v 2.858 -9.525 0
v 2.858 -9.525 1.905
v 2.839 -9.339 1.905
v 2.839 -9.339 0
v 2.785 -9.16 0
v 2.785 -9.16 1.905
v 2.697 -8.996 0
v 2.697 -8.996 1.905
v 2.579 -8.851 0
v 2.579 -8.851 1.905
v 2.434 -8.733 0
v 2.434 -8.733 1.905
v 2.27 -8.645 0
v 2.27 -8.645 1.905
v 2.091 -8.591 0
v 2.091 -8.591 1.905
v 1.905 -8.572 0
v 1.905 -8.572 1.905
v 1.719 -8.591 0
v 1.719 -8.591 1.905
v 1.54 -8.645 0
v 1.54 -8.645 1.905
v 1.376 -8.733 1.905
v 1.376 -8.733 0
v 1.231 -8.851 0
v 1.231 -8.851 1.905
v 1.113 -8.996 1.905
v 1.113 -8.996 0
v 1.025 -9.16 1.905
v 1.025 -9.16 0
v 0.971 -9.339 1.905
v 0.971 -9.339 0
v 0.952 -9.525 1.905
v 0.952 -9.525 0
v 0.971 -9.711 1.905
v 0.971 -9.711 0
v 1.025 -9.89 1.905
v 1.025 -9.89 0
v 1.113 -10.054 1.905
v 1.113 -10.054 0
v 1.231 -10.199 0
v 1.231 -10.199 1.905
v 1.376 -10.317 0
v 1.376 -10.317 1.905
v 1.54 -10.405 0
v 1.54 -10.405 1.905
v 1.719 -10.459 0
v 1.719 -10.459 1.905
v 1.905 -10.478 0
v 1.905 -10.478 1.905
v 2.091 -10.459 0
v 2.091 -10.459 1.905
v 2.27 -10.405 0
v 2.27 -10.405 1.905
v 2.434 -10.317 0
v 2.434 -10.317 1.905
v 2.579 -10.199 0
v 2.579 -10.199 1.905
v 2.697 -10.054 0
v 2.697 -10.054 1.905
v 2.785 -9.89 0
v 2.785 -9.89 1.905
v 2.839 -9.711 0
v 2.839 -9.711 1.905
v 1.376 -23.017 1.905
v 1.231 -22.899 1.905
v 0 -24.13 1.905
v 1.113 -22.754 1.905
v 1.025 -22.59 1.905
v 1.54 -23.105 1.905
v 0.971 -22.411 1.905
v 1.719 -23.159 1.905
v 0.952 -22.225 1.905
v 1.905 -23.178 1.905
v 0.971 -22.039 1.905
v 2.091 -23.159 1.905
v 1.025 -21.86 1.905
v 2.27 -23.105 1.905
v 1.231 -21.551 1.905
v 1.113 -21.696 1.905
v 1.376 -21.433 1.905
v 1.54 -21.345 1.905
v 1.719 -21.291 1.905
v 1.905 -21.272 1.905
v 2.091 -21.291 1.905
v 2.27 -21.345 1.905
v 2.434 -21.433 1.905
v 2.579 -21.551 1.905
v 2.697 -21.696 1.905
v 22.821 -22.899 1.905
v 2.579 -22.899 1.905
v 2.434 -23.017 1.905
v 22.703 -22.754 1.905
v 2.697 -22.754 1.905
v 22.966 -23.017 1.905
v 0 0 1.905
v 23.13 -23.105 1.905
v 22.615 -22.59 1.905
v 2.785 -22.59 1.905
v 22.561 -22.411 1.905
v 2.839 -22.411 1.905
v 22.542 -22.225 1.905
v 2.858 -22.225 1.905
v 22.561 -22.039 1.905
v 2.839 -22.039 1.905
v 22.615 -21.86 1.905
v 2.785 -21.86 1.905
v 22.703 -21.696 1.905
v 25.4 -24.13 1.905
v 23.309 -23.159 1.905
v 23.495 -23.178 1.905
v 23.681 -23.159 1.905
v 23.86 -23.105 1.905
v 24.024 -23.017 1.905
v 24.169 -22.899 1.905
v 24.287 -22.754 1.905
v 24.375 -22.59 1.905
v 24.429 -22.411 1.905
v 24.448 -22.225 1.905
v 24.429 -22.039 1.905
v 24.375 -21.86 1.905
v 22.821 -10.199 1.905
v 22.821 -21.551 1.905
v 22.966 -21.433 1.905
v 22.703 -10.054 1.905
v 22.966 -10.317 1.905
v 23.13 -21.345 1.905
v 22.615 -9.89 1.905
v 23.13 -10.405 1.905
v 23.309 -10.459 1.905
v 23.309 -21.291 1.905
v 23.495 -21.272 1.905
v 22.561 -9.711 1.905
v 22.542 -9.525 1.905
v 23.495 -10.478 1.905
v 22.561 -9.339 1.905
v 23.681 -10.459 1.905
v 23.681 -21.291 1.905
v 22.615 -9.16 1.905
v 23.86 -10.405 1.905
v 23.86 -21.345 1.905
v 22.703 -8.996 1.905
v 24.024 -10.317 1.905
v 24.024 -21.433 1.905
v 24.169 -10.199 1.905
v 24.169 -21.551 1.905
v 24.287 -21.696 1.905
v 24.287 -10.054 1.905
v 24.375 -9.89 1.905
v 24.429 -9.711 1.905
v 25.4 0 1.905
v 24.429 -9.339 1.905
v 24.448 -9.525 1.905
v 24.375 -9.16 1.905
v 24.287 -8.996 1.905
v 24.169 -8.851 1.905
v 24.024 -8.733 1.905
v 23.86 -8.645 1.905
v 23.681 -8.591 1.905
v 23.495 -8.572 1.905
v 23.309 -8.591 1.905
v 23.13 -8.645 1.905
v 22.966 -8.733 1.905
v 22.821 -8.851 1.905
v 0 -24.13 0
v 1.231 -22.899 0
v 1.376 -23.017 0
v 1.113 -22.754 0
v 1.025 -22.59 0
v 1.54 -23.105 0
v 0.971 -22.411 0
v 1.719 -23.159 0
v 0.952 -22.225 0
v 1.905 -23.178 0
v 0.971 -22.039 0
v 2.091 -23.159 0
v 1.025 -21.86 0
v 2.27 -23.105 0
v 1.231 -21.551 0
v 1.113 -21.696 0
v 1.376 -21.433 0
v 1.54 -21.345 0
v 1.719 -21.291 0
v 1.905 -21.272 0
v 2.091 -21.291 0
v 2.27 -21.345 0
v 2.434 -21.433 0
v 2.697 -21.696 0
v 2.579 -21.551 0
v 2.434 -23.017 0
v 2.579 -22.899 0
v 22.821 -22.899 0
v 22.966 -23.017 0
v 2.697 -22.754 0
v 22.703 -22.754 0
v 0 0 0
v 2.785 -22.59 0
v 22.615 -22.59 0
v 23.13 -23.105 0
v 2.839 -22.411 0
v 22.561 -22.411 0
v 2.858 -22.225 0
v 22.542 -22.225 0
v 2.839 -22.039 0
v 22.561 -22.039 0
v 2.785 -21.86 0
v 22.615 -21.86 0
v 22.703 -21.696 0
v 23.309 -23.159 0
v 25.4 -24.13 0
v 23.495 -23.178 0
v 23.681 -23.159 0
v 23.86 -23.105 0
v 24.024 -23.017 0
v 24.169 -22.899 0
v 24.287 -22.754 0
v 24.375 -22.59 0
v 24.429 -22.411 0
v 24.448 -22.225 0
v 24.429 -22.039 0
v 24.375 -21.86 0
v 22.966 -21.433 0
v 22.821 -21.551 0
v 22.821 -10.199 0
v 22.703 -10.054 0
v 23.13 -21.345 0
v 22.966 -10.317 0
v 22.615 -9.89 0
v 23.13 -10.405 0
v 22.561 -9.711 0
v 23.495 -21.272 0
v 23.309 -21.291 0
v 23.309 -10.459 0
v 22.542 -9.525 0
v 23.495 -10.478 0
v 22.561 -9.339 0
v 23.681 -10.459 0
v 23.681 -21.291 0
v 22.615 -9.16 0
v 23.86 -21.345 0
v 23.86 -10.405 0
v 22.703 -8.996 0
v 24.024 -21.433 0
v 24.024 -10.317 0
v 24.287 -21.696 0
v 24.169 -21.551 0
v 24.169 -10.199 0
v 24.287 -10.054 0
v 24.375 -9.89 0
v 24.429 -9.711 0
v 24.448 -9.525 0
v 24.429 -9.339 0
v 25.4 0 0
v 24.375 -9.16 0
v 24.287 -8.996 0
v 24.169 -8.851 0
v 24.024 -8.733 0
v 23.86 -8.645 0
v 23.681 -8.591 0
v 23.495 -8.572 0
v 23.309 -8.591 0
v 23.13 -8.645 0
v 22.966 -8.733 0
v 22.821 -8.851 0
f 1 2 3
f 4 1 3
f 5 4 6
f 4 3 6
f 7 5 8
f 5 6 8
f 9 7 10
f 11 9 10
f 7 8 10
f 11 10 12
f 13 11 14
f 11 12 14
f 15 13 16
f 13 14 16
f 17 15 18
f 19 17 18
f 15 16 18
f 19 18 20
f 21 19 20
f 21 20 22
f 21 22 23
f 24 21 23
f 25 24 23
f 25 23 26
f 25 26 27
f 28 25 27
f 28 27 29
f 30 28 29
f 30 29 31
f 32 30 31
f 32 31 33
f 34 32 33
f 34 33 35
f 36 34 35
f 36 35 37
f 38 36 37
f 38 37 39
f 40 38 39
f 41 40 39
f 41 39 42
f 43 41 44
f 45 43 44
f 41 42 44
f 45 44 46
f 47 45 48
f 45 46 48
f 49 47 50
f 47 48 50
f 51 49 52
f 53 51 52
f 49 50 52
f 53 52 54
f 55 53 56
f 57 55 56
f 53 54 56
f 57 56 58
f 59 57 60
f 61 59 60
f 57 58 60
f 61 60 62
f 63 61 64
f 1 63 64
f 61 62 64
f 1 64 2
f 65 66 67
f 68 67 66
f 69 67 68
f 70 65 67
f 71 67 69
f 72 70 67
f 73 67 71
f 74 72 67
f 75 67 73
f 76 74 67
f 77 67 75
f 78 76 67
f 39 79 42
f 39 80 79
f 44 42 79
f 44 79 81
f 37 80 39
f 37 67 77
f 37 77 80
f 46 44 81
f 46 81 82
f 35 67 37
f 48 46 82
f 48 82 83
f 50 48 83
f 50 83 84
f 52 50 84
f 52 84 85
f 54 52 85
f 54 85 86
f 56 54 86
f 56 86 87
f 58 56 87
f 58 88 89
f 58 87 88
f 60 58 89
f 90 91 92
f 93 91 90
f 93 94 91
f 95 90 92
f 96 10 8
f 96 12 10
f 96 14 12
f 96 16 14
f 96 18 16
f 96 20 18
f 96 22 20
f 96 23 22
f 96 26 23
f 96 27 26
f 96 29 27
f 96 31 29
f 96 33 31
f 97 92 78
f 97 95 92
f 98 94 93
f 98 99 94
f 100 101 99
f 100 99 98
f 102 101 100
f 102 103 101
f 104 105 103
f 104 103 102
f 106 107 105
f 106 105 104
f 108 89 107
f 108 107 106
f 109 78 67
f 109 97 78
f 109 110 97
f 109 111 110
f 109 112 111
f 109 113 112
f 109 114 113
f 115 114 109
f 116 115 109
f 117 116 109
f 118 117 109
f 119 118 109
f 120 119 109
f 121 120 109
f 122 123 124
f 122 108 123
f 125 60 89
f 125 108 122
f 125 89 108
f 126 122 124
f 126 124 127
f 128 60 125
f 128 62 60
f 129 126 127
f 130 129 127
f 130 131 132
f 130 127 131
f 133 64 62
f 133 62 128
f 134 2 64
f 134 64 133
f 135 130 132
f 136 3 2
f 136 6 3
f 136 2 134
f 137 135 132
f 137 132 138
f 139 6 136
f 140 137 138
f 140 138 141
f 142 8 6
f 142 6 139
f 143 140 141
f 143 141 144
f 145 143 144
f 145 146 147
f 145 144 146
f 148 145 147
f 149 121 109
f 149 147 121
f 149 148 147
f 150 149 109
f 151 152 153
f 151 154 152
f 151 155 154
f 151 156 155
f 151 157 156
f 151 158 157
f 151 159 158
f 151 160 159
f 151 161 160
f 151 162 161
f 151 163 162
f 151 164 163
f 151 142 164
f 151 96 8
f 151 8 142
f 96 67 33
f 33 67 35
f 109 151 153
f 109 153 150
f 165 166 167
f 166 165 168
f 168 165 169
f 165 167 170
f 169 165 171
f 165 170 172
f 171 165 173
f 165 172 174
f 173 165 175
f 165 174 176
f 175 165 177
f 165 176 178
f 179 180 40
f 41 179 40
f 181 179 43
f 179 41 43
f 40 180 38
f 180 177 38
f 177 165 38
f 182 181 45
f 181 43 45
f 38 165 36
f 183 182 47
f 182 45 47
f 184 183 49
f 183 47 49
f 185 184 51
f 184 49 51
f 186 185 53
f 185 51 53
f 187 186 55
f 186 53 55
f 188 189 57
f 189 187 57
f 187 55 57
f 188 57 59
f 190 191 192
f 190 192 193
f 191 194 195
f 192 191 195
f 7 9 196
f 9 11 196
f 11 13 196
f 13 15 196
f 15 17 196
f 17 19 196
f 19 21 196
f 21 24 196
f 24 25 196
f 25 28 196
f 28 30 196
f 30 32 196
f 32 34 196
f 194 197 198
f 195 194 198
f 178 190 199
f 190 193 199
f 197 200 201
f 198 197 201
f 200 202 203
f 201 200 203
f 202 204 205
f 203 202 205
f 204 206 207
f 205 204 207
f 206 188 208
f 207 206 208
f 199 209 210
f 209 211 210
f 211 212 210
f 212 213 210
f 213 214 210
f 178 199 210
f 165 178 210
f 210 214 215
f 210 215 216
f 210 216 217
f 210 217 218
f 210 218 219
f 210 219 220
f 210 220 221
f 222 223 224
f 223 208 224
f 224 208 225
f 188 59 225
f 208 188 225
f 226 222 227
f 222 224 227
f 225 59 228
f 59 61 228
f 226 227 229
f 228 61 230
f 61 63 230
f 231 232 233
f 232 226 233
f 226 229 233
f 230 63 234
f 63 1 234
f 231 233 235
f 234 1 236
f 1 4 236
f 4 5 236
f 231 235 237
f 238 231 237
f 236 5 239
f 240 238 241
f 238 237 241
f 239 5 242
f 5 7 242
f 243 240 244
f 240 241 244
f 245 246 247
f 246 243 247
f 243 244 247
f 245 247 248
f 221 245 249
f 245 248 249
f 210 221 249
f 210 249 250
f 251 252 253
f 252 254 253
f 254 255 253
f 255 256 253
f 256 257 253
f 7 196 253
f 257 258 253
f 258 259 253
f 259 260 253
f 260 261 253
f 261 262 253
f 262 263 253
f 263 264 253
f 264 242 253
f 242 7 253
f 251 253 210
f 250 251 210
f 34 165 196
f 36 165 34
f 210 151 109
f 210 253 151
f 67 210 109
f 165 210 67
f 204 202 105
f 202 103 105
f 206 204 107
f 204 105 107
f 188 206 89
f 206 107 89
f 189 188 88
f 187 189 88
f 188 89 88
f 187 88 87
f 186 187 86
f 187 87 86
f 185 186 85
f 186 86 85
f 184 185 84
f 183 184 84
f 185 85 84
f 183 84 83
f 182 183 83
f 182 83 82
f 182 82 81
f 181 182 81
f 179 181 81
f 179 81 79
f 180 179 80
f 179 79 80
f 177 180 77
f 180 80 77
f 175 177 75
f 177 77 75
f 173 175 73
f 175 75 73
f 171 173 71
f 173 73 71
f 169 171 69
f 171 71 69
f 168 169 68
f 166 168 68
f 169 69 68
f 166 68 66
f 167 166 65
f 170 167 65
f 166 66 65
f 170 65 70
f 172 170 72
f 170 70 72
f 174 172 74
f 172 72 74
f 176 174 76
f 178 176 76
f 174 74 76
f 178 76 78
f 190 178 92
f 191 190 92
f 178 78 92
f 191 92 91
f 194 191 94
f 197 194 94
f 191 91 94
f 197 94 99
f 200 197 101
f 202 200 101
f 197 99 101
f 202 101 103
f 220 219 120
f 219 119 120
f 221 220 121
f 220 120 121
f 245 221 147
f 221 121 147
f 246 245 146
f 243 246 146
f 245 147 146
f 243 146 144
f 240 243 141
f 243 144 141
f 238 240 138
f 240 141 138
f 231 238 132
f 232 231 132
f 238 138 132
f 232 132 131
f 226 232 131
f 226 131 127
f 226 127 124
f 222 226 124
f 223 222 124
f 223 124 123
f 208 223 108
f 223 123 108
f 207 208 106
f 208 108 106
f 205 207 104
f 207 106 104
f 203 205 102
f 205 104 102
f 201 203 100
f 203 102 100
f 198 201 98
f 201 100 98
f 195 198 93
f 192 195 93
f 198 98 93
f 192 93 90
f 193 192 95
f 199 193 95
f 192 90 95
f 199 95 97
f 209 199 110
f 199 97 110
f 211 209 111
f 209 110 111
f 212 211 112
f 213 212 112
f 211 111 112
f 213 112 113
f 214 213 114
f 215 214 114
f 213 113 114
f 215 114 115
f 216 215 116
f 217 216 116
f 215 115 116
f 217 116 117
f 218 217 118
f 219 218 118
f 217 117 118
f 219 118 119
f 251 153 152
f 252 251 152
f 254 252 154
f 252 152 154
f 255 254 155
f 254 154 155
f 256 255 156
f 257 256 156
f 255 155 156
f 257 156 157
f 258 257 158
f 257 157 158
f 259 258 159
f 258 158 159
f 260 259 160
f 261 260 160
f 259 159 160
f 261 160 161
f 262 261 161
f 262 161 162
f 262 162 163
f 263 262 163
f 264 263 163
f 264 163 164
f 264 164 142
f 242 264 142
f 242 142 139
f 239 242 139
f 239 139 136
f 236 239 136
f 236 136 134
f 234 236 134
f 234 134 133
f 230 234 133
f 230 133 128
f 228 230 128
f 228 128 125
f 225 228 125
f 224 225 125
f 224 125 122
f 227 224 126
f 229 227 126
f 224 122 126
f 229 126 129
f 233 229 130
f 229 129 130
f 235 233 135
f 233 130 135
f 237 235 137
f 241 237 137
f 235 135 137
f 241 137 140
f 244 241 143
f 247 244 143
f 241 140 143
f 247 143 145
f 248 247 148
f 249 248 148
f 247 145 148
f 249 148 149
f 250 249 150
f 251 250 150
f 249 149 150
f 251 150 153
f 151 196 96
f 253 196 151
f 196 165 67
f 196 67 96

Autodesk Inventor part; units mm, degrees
ref_plane "YZ Plane" through (0, 0, 0) normal (1, 0, 0) x (0, 1, 0)
ref_plane "XZ Plane" through (0, 0, 0) normal (0, 1, 0) x (-1, 0, 0)
ref_plane "XY Plane" through (0, 0, 0) normal (0, 0, 1) x (1, 0, 0)
sketch "Sketch1" plane through (0, 0, 0) normal (0, 0, 1) x (1, 0, 0)
  line L0 (0, 0) -> (25.4, 0)
  line L1 (25.4, 0) -> (25.4, -24.13)
  line L2 (25.4, -24.13) -> (0, -24.13)
  line L3 (0, -24.13) -> (0, 0)
  dimension "d0" = 25.4
  dimension "d1" = 24.13
extrude "Extrusion1" add sketch "Sketch1" along normal blind 1.905
sketch "Sketch2" plane through (0, 0, 1.905) normal (0, 0, 1) x (1, 0, 0)
  circle A0 centre (1.905, -22.225) radius 0.9525
  circle A1 centre (1.905, -9.525) radius 0.9525
  circle A2 centre (23.495, -9.525) radius 0.9525
  circle A3 centre (23.495, -22.225) radius 0.9525
  line L0 (25.4, -24.13) -> (25.4, 0) projected
  line L1 (0, -24.13) -> (25.4, -24.13) projected
  line L2 (0, 0) -> (0, -24.13) projected
  line L3 (25.4, 0) -> (0, 0) projected
  dimension "d4" = 1.905
  dimension "d5" = 1.905
  dimension "d6" = 1.905
  dimension "d7" = 1.905
  dimension "d8" = 1.905
  dimension "d9" = 1.905
  dimension "d10" = 1.905
  dimension "d11" = 1.905
  dimension "d12" = 9.525
  dimension "d13" = 9.525
  dimension "d14" = 1.905
  dimension "d15" = 1.905
extrude "Extrusion2" cut sketch "Sketch2" against normal blind 1.905 contours A0 | A1 | A2 | A3
properties part number "CameraBoard" material "Thermoplastic Resin"
